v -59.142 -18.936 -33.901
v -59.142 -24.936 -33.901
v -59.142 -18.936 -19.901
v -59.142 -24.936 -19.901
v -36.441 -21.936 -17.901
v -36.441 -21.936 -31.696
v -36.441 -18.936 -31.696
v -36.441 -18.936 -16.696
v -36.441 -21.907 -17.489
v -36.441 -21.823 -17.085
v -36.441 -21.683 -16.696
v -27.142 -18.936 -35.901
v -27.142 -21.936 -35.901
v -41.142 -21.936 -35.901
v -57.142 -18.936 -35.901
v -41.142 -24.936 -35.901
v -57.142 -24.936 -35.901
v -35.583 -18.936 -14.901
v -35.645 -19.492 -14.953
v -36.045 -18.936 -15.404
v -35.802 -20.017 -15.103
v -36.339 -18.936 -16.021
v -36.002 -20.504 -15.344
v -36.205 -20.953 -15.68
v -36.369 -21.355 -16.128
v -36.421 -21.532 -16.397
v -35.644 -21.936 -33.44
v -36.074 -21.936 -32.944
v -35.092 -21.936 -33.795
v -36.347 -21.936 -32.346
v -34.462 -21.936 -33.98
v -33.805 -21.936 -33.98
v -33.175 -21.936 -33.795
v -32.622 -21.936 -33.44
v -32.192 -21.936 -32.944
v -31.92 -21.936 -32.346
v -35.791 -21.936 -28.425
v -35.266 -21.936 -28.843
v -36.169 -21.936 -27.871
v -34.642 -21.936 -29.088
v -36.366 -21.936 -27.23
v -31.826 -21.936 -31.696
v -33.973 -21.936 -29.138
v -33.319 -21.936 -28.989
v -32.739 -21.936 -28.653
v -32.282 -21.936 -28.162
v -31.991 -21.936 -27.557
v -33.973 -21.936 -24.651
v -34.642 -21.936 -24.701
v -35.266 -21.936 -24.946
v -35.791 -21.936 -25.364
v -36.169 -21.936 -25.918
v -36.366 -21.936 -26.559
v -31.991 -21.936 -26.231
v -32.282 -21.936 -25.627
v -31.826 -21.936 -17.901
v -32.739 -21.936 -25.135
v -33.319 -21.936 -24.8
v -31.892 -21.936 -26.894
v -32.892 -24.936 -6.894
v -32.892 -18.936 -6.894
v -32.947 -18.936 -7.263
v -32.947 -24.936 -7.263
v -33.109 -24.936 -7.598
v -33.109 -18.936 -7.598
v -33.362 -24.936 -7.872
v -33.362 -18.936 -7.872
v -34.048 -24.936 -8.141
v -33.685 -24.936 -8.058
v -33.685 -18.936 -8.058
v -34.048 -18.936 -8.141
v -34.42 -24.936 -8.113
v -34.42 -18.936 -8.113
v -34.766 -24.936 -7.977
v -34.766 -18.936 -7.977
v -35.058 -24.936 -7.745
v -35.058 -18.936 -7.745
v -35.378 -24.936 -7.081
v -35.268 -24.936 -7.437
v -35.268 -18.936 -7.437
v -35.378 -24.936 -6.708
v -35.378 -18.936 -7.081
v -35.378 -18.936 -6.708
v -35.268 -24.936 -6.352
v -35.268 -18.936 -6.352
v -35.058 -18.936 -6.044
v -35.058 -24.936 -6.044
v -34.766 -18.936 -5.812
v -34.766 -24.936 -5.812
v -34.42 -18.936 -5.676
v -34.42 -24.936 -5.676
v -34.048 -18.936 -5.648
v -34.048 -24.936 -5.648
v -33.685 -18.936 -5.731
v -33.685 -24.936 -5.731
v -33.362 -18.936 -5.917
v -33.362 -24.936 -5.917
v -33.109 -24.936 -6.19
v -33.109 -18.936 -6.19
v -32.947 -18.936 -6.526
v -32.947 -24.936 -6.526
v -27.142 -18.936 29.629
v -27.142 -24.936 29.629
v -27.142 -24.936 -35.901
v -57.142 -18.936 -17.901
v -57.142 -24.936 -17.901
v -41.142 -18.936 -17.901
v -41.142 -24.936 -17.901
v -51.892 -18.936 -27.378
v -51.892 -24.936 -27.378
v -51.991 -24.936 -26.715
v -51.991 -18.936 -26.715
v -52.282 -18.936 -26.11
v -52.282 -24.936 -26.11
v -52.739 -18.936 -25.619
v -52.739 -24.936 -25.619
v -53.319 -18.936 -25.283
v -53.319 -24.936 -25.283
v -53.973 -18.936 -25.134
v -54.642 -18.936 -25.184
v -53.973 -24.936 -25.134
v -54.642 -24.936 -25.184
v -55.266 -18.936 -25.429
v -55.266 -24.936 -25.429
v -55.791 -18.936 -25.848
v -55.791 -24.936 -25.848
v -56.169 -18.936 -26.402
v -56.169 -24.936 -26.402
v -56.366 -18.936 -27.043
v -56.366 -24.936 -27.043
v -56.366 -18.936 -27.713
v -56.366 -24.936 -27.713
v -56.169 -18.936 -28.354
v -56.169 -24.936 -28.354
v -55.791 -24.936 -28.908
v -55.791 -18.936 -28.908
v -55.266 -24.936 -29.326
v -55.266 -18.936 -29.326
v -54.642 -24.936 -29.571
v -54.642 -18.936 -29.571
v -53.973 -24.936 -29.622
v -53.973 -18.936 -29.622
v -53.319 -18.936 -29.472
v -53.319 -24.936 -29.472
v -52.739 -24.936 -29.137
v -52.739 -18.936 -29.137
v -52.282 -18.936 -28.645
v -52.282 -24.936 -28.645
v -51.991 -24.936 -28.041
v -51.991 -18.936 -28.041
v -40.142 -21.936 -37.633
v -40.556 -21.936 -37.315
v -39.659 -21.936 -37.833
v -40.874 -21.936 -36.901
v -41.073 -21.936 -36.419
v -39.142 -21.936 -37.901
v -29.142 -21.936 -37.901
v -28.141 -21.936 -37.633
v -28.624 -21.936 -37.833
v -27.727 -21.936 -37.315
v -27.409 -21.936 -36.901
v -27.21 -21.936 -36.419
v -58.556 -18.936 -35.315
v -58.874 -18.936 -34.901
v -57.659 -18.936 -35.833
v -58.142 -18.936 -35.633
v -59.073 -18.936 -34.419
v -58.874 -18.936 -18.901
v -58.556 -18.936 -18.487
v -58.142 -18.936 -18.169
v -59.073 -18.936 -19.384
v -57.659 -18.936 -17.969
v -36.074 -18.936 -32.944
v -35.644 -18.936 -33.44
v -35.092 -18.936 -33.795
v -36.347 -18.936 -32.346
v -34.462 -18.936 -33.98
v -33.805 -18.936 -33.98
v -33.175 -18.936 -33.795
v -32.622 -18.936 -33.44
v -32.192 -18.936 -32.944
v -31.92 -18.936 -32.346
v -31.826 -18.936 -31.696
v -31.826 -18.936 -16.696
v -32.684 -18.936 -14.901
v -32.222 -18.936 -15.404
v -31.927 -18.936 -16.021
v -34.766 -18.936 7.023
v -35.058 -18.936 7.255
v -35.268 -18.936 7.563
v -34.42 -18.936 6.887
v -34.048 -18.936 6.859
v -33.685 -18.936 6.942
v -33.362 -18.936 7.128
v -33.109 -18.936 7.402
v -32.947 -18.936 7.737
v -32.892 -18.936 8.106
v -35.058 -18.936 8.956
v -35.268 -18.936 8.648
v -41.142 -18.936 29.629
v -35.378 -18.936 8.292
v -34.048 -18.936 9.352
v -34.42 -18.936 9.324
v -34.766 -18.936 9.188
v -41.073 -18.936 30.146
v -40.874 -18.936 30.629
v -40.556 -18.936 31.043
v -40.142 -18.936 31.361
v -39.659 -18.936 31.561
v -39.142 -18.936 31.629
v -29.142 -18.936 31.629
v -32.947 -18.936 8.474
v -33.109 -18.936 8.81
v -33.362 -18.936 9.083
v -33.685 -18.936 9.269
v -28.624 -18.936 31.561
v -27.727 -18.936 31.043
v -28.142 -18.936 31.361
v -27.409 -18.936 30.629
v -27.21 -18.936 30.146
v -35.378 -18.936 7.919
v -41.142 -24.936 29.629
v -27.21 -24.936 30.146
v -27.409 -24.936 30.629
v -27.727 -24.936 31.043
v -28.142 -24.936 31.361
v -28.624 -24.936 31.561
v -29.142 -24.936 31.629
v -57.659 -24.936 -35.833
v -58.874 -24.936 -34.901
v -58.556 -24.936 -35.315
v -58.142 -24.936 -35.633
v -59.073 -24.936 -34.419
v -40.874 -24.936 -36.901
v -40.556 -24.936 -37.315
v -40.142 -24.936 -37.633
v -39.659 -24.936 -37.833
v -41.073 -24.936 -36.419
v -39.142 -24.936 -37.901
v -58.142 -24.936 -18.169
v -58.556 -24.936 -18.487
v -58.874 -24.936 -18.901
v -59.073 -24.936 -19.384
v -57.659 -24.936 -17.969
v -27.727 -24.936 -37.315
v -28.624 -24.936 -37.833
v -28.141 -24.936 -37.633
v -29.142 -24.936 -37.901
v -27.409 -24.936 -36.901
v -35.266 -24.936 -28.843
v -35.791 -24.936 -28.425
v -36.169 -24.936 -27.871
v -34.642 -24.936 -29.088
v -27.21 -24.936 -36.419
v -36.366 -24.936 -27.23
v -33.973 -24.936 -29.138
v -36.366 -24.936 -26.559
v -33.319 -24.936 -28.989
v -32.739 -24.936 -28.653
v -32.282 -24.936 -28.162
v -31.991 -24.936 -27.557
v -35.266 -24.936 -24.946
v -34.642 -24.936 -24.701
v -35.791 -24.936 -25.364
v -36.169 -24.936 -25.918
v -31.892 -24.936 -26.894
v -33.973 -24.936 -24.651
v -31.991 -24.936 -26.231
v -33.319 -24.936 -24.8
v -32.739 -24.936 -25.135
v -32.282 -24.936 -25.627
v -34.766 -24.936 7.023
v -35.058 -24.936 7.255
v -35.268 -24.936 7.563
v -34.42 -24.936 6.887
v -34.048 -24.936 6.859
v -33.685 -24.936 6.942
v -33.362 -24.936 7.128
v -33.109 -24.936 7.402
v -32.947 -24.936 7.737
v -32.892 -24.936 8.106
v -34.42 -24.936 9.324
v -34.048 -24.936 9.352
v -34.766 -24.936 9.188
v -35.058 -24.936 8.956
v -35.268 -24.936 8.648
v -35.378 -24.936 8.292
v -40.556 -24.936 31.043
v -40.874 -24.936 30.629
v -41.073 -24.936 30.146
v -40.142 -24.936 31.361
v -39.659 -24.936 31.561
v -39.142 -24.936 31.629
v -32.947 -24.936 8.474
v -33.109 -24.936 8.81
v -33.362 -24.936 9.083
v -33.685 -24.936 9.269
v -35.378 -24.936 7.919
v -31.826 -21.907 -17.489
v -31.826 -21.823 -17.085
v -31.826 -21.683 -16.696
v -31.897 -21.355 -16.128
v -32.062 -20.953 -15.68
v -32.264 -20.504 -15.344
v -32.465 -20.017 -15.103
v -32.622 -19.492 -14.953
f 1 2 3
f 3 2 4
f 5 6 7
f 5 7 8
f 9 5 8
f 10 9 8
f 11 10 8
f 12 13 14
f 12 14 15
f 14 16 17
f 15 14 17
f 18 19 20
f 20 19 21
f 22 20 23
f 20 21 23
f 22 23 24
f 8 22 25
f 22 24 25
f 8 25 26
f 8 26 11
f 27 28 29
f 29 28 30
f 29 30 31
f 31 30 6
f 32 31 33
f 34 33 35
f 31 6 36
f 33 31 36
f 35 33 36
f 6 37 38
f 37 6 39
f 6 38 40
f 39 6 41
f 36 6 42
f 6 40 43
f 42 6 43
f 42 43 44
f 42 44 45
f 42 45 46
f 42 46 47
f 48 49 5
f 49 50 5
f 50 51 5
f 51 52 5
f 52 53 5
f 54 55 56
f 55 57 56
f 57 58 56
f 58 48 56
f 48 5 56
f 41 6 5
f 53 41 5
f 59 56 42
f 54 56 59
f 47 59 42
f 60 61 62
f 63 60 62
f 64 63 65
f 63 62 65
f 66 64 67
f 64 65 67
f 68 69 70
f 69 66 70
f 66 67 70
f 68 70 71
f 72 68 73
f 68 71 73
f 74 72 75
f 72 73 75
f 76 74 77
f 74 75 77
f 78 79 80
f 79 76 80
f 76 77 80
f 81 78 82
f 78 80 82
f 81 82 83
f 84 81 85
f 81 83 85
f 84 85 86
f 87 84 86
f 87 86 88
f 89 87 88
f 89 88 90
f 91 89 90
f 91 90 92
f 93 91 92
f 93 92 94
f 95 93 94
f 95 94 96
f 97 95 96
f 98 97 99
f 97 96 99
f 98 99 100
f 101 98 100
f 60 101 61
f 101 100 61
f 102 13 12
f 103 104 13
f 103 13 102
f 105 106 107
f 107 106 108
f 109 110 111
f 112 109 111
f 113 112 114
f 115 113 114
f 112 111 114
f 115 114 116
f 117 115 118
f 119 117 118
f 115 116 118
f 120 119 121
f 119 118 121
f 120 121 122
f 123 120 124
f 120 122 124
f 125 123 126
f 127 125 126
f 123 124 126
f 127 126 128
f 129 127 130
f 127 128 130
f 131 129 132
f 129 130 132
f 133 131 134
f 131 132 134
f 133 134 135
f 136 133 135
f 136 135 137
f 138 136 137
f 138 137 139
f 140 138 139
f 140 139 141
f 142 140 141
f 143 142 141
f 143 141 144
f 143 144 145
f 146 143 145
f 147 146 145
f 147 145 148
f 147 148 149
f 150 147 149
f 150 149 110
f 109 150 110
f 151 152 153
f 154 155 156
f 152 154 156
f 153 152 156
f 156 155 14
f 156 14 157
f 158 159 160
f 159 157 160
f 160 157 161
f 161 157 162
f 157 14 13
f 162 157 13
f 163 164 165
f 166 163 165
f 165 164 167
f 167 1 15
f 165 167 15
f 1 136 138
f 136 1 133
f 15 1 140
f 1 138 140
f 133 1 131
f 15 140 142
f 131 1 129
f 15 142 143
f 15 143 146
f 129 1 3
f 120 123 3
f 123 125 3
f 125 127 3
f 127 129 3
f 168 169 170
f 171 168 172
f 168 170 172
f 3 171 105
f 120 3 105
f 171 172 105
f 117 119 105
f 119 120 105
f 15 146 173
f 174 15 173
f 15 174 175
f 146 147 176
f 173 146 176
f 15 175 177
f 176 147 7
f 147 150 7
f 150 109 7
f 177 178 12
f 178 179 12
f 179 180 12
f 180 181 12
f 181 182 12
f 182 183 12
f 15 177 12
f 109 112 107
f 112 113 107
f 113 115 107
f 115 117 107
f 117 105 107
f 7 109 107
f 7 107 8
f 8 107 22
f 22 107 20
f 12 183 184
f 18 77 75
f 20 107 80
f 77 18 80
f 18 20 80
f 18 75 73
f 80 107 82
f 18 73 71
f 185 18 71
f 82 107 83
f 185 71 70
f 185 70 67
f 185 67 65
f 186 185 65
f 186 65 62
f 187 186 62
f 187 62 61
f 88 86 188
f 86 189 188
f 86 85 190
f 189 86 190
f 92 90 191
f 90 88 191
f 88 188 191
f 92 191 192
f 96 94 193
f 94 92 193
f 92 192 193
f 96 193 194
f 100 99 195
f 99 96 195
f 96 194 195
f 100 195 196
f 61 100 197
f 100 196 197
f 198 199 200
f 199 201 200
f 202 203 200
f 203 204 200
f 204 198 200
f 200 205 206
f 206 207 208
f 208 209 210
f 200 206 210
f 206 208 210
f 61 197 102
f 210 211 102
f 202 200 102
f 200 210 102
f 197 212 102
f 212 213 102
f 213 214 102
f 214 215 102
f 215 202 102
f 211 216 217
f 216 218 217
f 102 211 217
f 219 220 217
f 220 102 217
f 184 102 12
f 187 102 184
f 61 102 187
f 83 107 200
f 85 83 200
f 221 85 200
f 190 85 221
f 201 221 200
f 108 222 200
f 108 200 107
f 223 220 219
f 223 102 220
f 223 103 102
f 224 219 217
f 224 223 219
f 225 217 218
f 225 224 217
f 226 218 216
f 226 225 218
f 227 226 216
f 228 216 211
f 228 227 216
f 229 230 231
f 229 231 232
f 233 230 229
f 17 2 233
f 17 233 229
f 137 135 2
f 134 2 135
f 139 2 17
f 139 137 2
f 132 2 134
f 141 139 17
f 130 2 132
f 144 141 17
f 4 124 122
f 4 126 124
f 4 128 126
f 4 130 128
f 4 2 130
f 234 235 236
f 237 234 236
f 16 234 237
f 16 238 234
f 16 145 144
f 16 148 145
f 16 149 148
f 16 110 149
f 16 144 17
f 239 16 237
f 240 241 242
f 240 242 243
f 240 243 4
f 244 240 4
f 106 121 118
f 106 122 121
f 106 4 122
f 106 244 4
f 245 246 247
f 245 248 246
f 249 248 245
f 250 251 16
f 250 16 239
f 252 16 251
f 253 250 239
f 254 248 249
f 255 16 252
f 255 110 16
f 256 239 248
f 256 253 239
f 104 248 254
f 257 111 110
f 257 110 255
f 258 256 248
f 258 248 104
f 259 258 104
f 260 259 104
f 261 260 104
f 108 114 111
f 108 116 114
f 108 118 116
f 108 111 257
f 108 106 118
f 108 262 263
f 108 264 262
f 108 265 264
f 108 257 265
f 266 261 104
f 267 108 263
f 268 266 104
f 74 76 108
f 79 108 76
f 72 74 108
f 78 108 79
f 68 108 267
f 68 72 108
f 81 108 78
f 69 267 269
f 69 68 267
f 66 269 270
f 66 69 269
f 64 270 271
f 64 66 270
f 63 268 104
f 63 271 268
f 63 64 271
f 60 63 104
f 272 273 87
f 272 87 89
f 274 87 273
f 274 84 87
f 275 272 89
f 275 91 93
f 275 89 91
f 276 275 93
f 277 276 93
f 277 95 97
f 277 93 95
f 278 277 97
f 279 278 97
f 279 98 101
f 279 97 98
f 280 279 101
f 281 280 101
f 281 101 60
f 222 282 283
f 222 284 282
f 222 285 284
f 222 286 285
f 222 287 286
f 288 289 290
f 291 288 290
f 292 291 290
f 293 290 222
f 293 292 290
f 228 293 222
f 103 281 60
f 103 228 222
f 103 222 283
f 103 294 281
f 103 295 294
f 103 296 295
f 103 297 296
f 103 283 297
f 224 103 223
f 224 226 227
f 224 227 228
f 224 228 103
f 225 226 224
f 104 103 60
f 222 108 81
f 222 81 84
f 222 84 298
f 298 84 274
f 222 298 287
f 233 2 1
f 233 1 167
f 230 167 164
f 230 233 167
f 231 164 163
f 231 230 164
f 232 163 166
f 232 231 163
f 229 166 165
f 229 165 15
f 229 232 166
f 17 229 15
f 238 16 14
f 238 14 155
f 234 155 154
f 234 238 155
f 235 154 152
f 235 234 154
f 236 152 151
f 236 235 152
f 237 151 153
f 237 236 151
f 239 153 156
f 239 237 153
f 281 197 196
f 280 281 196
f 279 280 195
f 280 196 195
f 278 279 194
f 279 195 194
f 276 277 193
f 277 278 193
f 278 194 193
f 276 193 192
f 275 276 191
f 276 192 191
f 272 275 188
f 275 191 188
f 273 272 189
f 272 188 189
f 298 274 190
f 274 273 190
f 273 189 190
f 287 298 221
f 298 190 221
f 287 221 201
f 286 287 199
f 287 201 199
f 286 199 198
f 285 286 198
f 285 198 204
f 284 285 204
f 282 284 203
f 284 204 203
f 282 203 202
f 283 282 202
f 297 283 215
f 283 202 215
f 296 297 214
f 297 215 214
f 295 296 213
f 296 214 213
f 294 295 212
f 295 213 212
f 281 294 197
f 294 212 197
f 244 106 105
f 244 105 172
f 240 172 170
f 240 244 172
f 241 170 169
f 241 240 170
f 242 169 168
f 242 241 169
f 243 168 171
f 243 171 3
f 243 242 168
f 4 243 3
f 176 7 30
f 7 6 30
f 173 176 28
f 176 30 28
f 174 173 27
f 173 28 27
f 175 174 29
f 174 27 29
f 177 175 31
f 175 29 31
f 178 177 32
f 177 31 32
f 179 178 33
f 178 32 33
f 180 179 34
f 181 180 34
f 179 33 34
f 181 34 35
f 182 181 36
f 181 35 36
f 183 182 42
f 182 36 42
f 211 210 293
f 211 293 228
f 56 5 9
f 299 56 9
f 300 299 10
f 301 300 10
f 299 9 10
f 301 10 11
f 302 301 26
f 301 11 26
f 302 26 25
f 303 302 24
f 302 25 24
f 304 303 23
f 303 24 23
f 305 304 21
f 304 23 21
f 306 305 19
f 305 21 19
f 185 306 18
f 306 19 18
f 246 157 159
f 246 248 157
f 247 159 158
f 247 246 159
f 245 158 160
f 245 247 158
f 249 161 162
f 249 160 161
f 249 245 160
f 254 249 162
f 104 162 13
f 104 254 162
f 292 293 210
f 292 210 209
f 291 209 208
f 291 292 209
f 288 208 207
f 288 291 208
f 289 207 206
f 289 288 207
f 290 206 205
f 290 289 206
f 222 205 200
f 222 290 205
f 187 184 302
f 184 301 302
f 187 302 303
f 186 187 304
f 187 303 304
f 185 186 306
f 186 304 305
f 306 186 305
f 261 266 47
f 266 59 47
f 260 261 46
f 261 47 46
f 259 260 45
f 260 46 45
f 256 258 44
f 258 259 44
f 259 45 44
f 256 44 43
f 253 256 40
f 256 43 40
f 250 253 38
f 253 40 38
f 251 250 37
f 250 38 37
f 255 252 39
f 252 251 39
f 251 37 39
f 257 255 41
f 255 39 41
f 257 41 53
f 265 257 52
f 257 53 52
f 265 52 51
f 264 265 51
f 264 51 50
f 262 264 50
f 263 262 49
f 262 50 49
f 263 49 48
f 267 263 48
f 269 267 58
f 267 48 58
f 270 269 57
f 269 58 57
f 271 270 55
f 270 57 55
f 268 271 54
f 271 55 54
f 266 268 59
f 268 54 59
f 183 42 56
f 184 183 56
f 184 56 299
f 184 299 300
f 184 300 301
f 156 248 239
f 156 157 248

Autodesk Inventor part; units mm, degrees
ref_plane "YZ Plane" through (0, 0, 0) normal (1, 0, 0) x (0, 1, 0)
ref_plane "XZ Plane" through (0, 0, 0) normal (0, 1, 0) x (-1, 0, 0)
ref_plane "XY Plane" through (0, 0, 0) normal (0, 0, 1) x (1, 0, 0)
ref_plane "РабПлоскость1" through (-30.8415, -18.9359, 233.6055) normal (0, -1, 0) x (1, 0, 0)
sketch "Эскиз1" plane through (-30.8415, -18.9359, 233.6055) normal (0, -1, 0) x (1, 0, 0)
  line L0 (-13.3, -2.4998) -> (-13.3, -252.4998) projected
  line L1 (6.7, -2.4998) -> (6.7, -252.4998) projected
  line L2 (-13.3, -201.9768) -> (6.7, -201.9768)
  line L3 (6.7, -201.9768) -> (6.7, -265.9768)
  line L4 (0.7, -271.9768) -> (-7.3, -271.9768)
  line L5 (-13.3, -265.9768) -> (-13.3, -201.9768)
  line L6 (-6.6, -2.4998) -> (-6.6, -252.4998) projected
  line L7 (0, -2.4998) -> (0, -252.4998) projected
  circle A0 centre (-3.3, -240.4998) radius 1.25
  circle A1 centre (-3.3, -225.4998) radius 1.25
  line L8 (-6.2394, -252.4998) -> (-3.6, -252.4998) projected
  arc A2 (-13.3, -265.9768) -> (-7.3, -271.9768) centre (-7.3, -265.9768) ccw
  arc A3 (0.7, -271.9768) -> (6.7, -265.9768) centre (0.7, -265.9768) ccw
  circle A4 centre (-3.3, -260.4999) radius 3.3 projected
  point P0 (30.8415, -233.6055)
  point P1 (-13.3, -271.9768)
  point P2 (-4.9197, -252.4998)
  dimension "d0" = 70
  dimension "d1" = 15
  dimension "d2" = 2.5
  dimension "d3" = 2.5
  dimension "d4" = 3.3
  dimension "d5" = 12
  dimension "d6" = 6
extrude "Выдавливание1" add sketch "Эскиз1" along normal blind 3
sketch "Эскиз2" plane through (-30.8415, -21.9359, 233.6055) normal (0, -1, 0) x (1, 0, 0)
  line L0 (-13.3, -201.9768) -> (-13.3, -265.9768) projected
  line L1 (-13.3, -248.5067) -> (-13.3, -271.9768)
  line L2 (-13.3, -271.9768) -> (6.7, -271.9768)
  line L3 (6.7, -271.9768) -> (6.7, -248.5067)
  line L4 (6.7, -265.9768) -> (6.7, -201.9768) projected
  line L5 (-13.3, -248.5067) -> (6.7, -248.5067)
  point P0 (30.8415, -233.6055)
  point P1 (0.7, -271.9768)
extrude "Выдавливание2" cut sketch "Эскиз2" against normal blind 3
sketch "Эскиз3" plane through (-30.8415, -21.9359, 233.6055) normal (0, -1, 0) x (1, 0, 0)
  line L0 (-13.3, -201.9768) -> (-13.3, -248.5067) projected
  line L1 (-13.3, -244.5067) -> (6.7, -244.5067)
  line L2 (6.7, -244.5067) -> (6.7, -271.5067)
  line L3 (6.7, -271.5067) -> (-13.3, -271.5067)
  line L4 (-13.3, -271.5067) -> (-13.3, -244.5067)
  line L5 (6.7, -248.5067) -> (6.7, -201.9768) projected
  line L6 (-13.3, -248.5067) -> (6.7, -248.5067) projected
  circle A0 centre (-3.3, -260.4998) radius 2.5 projected
  circle A1 centre (-3.3, -260.4998) radius 2.25
  point P0 (30.8415, -233.6055)
  dimension "d11" = 27
  dimension "d12" = 4
  dimension "d22" = 4.5
extrude "Выдавливание3" add sketch "Эскиз3" along normal blind 3 contours L1 L2 L6 L0 | L6 L2 L3 L4 | A0
fillet "Сопряжение1" radius 3 3 edges at (-34.1415, -21.9359, -10.9012) (-34.1415, -21.9359, -14.9012) (-34.1415, -24.9359, -10.9012)
fillet "Сопряжение2" radius 3 4 edges at (-44.1415, -23.4359, -37.9012) (-24.1415, -23.4359, -37.9012) (-44.1415, -20.4359, 31.6287) (-24.1415, -20.4359, 31.6287)
sketch "Эскиз4" plane through (-30.8415, -21.9359, 233.6055) normal (0, -1, 0) x (1, 0, 0)
  arc A0 (3.7, -271.5067) -> (6.7, -268.5067) centre (3.7, -268.5067) ccw projected
  line L0 (3.7, -271.5067) -> (6.7, -271.5067)
  line L1 (6.7, -271.5067) -> (6.7, -201.9768)
  line L2 (6.7, -201.9768) -> (3.7, -201.9768)
  line L3 (3.7, -201.9768) -> (3.7, -271.5067)
  arc A1 (-13.3, -268.5067) -> (-10.3, -271.5067) centre (-10.3, -268.5067) ccw projected
  line L4 (-10.3, -271.5067) -> (-13.3, -271.5067)
  line L5 (-13.3, -271.5067) -> (-13.3, -201.9768)
  line L6 (-13.3, -201.9768) -> (-10.3, -201.9768)
  line L7 (-10.3, -201.9768) -> (-10.3, -271.5067)
  point P0 (30.8415, -233.6055)
  point P1 (-13.3, -268.5067)
  point P2 (6.7, -268.5067)
extrude "Выдавливание4" cut sketch "Эскиз4" along normal blind 10 and the other way blind 5 contours L3 L2 L1 A0 | L5 L6 L7 A1
fillet "Сопряжение3" radius 2 4 edges at (-41.1415, -23.4359, -37.9012) (-27.1415, -23.4359, -37.9012) (-27.1415, -20.4359, 31.6287) (-41.1415, -20.4359, 31.6287)
sketch "Эскиз5" plane through (-30.8415, -24.9359, 233.6055) normal (0, -1, 0) x (1, 0, 0)
  arc A0 (1.7, -271.5067) -> (3.7, -269.5067) centre (1.7, -269.5067) ccw projected
  line L0 (3.7, -269.5067) -> (3.7, -247.5067) projected
  line L1 (-10.3, -247.5067) -> (3.7, -247.5067) projected
  line L2 (-10.3, -247.5067) -> (-10.3, -269.5067) projected
  arc A1 (-10.3, -269.5067) -> (-8.3, -271.5067) centre (-8.3, -269.5067) ccw projected
  line L3 (-8.3, -271.5067) -> (1.7, -271.5067) projected
  circle A2 centre (-3.3, -260.4998) radius 2.25 projected
  arc A3 (-8.3, -201.9768) -> (-10.3, -203.9768) centre (-8.3, -203.9768) ccw projected
  line L4 (-10.3, -203.9768) -> (-10.3, -242.3106) projected
  line L5 (3.7, -242.3106) -> (-10.3, -242.3106) projected
  line L6 (3.7, -242.3106) -> (3.7, -203.9768) projected
  arc A4 (3.7, -203.9768) -> (1.7, -201.9768) centre (1.7, -203.9768) ccw projected
  line L7 (1.7, -201.9768) -> (-8.3, -201.9768) projected
  circle A5 centre (-3.3, -225.4998) radius 1.25 projected
  circle A6 centre (-3.3, -240.4998) radius 1.25 projected
  line L8 (-10.3, -242.3106) -> (-10.3, -244.9086) projected
  line L9 (-10.3, -244.9086) -> (3.7, -244.9086) projected
  line L10 (3.7, -244.9086) -> (3.7, -242.3106) projected
  line L11 (3.7, -242.3106) -> (-10.3, -242.3106) projected
  line L12 (-10.3, -244.9086) -> (-10.3, -247.5067) projected
  line L13 (-10.3, -247.5067) -> (3.7, -247.5067) projected
  line L14 (3.7, -247.5067) -> (3.7, -244.9086) projected
  line L15 (-10.3, -244.9086) -> (3.7, -244.9086) projected
  point P0 (30.8415, -233.6055)
sketch "Эскиз6" plane through (-30.8415, -24.9359, 233.6055) normal (0, -1, 0) x (1, 0, 0)
  line L0 (-10.3, -269.5067) -> (-26.3, -269.5067)
  circle A0 centre (-23.3, -260.9834) radius 2.25
  line L1 (3.7, -269.5067) -> (3.7, -247.5067) projected
  line L2 (3.7, -244.9086) -> (3.7, -247.5067) projected
  line L3 (3.7, -244.9086) -> (3.7, -242.3106) projected
  line L4 (3.7, -242.3106) -> (3.7, -203.9768) projected
  arc A1 (3.7, -203.9768) -> (1.7, -201.9768) centre (1.7, -203.9768) ccw projected
  line L5 (1.7, -201.9768) -> (-8.3, -201.9768) projected
  arc A2 (-8.3, -201.9768) -> (-10.3, -203.9768) centre (-8.3, -203.9768) ccw projected
  line L6 (-10.3, -203.9768) -> (-10.3, -242.3106) projected
  line L7 (-10.3, -242.3106) -> (-10.3, -244.9086) projected
  line L8 (-28.3, -267.5067) -> (-28.3, -253.5067)
  line L9 (-26.3, -251.5067) -> (-10.3, -251.5067)
  line L10 (-10.3, -244.9086) -> (-10.3, -251.5067)
  circle A3 centre (-3.3, -240.4998) radius 1.25 projected
  circle A4 centre (-3.3, -225.4998) radius 1.25 projected
  arc A5 (-28.3, -267.5067) -> (-26.3, -269.5067) centre (-26.3, -267.5067) ccw
  arc A6 (-26.3, -251.5067) -> (-28.3, -253.5067) centre (-26.3, -253.5067) ccw
  line L11 (3.7, -251.5067) -> (3.7, -269.5067) projected
  line L12 (-10.3, -269.5067) -> (3.7, -269.5067)
  line L13 (-5.5991, -265.3019) -> (-5.5991, -250.3019)
  line L14 (-0.9846, -265.3019) -> (-0.9846, -250.3019)
  arc A7 (-5.5991, -265.3019) -> (-0.9846, -265.3019) centre (-3.2919, -265.3019) ccw
  arc A8 (-0.9846, -250.3019) -> (-5.5991, -250.3019) centre (-3.2919, -250.3019) ccw
  circle A9 centre (-3.3, -260.4998) radius 2.25 projected
  point P0 (30.8415, -233.6055)
  point P1 (-28.3, -269.5067)
  point P2 (-18.3, -251.5067)
  dimension "d23" = 20
  dimension "d24" = 18
  dimension "d25" = 18
  dimension "d26" = 2
  dimension "d27" = 15
extrude "Выдавливание5" add sketch "Эскиз6" against normal blind 6 contours L0 A5 L8 A6 L9 L10 L7 L6 A2 L5 A1 L4 L3 L2 L1 L12
properties part number "крепление шкива боковое"
